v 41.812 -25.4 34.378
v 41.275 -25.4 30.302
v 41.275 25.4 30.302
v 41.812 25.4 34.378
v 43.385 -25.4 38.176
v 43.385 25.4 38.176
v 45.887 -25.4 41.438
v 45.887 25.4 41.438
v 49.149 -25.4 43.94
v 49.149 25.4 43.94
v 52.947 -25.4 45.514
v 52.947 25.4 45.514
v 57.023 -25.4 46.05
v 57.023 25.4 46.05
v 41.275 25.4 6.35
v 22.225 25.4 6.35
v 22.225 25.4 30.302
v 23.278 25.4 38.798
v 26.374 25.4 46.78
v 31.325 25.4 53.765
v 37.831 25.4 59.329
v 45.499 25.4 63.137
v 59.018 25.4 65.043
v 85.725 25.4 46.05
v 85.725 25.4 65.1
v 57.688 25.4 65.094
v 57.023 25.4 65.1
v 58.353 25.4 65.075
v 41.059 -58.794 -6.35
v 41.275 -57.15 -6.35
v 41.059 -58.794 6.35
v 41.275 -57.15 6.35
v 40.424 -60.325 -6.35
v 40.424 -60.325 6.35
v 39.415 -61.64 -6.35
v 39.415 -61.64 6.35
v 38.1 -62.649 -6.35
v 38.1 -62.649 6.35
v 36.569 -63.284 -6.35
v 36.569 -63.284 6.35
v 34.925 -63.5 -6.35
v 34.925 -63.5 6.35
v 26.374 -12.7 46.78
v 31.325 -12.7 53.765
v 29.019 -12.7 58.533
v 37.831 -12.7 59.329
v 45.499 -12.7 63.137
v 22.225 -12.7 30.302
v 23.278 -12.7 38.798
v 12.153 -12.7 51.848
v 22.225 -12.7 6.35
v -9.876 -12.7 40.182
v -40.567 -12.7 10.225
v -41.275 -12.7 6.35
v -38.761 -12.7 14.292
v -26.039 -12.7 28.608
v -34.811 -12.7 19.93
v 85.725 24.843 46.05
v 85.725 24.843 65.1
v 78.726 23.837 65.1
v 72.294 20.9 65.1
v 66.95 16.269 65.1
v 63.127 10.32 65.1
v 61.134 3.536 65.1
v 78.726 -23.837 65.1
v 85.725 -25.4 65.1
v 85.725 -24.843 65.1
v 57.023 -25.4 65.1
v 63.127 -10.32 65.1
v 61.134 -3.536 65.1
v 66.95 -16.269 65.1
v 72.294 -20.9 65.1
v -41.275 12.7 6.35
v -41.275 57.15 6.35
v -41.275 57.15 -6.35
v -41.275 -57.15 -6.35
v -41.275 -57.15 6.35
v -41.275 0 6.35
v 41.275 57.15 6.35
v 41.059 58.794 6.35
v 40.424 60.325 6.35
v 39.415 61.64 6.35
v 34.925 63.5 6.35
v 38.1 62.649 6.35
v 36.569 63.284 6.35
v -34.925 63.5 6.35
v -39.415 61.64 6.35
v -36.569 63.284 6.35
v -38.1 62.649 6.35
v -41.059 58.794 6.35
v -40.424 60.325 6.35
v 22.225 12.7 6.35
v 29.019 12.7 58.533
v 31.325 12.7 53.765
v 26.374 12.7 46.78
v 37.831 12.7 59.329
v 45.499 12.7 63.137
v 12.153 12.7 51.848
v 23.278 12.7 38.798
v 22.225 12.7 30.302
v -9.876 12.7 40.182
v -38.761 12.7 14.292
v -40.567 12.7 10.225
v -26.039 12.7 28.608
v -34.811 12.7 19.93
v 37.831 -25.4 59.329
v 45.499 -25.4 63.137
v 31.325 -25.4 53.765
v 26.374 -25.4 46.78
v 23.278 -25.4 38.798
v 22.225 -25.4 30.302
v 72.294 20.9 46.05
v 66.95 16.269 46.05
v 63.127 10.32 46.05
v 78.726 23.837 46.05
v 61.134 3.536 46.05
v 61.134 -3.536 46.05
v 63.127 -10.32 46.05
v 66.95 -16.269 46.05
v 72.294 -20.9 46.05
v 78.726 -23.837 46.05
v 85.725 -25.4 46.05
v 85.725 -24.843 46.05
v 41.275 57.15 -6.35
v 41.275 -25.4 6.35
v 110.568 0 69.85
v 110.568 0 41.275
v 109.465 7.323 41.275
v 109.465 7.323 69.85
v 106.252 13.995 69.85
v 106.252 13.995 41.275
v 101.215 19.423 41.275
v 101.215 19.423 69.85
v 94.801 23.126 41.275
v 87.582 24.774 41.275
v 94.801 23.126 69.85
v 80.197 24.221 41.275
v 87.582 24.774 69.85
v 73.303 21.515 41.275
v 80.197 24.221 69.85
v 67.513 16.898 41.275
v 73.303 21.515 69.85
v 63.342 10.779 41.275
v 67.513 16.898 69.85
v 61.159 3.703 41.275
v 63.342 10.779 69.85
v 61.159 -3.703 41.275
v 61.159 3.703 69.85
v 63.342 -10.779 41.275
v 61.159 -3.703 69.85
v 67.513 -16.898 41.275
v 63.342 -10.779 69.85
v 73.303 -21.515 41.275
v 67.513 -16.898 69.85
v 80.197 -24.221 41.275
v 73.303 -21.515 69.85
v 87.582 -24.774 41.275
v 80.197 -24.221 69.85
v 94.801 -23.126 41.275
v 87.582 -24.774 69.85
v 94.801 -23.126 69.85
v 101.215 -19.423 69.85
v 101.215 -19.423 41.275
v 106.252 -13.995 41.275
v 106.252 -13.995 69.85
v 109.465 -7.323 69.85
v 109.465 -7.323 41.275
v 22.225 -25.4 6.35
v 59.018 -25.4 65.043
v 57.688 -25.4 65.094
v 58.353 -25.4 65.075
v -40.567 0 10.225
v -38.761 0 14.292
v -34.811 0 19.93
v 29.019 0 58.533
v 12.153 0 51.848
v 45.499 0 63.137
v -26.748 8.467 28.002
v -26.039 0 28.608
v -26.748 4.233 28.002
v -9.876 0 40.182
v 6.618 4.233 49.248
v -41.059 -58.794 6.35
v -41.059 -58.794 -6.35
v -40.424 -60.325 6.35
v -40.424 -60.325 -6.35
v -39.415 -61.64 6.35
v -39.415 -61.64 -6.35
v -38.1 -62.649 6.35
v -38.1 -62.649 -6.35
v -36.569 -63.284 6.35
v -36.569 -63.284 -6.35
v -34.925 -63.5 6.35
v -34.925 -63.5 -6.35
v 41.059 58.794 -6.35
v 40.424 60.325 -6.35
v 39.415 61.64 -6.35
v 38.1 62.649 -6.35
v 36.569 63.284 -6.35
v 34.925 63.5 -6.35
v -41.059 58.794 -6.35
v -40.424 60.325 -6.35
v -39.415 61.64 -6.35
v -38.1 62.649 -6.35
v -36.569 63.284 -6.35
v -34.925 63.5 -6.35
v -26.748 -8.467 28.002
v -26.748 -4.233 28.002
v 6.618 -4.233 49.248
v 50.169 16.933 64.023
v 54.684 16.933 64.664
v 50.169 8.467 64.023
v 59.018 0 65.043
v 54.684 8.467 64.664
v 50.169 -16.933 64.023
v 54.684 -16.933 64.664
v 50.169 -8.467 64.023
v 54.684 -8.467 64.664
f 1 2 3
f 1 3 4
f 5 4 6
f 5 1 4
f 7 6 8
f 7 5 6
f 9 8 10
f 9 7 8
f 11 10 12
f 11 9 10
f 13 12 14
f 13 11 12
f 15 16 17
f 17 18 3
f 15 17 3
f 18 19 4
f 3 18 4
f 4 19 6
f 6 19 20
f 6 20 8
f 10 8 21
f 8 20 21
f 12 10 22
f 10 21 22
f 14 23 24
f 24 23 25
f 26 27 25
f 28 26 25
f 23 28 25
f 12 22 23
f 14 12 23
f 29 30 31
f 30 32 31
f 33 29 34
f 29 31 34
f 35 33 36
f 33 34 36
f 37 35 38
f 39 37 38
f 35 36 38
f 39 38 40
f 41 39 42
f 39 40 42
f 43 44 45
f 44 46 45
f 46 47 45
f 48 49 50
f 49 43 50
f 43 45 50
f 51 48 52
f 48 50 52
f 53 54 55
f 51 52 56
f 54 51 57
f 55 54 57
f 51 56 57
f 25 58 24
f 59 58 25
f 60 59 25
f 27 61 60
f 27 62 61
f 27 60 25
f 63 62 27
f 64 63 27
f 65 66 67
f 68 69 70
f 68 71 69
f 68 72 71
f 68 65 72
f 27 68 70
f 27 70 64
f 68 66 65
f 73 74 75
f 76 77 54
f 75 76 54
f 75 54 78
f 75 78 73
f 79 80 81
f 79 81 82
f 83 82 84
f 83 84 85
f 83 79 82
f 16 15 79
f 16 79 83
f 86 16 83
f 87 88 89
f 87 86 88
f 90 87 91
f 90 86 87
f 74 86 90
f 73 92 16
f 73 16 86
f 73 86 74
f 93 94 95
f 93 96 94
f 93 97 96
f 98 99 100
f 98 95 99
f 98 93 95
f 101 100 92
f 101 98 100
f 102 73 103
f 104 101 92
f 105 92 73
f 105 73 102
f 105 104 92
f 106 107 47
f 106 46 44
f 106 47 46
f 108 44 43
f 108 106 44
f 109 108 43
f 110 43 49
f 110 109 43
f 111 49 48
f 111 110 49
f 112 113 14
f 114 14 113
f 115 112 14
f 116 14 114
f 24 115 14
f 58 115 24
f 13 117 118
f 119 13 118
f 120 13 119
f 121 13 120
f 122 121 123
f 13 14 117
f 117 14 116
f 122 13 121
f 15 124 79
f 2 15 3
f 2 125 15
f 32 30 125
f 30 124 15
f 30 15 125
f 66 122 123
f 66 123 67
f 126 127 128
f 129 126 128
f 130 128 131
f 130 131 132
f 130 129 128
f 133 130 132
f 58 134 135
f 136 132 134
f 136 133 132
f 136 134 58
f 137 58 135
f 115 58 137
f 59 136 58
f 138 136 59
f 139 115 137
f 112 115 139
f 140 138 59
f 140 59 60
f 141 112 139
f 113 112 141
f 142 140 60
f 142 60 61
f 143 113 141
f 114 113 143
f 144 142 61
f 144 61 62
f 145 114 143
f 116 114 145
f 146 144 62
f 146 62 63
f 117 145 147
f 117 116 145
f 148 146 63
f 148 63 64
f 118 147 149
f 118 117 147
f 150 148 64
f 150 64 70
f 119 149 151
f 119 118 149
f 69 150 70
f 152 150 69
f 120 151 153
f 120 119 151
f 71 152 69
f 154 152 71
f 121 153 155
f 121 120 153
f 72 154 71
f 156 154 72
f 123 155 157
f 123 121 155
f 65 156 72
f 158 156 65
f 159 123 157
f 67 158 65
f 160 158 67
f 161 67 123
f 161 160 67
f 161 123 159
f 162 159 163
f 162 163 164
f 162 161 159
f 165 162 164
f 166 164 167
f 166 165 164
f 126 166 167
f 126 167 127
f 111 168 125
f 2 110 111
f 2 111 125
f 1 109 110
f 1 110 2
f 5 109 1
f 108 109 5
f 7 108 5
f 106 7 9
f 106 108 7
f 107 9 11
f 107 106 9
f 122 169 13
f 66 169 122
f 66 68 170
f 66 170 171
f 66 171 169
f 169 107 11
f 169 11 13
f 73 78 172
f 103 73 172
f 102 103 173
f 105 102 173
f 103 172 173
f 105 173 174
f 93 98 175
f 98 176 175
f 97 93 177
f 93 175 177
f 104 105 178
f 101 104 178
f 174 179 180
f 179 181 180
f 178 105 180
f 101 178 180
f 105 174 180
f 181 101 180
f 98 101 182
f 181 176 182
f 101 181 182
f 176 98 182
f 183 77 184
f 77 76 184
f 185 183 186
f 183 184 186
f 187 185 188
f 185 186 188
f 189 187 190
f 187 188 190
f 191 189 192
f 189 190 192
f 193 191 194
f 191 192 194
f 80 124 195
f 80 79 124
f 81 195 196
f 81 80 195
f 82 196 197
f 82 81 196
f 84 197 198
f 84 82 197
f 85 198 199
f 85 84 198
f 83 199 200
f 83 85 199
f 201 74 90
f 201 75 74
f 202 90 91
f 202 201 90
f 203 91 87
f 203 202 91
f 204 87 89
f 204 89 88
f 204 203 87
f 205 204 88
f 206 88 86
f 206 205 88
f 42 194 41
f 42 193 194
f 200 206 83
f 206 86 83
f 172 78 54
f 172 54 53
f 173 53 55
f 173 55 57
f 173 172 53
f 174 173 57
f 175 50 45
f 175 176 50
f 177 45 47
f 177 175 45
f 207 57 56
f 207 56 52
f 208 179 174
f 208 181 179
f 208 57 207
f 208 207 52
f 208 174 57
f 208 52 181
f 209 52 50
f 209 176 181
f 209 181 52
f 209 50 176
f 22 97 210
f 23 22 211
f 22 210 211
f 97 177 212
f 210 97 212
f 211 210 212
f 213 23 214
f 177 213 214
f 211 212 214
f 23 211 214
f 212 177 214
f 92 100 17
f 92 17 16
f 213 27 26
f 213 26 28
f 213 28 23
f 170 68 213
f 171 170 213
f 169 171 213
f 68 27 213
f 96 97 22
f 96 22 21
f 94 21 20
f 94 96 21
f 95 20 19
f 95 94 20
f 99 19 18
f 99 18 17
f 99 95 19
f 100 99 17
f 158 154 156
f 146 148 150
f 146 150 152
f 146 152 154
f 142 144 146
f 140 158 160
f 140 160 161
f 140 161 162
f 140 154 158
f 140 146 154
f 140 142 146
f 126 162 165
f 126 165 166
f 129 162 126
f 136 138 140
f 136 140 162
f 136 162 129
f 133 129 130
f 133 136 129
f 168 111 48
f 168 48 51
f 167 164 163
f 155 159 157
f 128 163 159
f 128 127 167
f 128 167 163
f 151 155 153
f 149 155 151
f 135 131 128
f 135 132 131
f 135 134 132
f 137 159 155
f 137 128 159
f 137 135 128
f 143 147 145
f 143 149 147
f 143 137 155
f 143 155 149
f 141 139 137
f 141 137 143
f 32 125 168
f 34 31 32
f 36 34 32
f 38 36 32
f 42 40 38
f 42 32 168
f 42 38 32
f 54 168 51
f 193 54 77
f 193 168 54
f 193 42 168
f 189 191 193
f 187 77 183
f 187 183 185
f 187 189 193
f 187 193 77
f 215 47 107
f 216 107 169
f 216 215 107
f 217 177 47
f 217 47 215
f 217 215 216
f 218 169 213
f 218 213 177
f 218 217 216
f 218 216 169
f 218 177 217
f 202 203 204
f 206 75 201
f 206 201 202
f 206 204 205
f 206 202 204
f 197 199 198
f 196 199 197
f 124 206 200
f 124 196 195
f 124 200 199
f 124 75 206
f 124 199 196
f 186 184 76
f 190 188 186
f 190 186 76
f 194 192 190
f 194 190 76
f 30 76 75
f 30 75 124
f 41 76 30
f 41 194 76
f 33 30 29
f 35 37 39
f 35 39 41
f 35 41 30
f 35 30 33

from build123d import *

# Parameters (mm, degrees)
F1_DEPTH = 63.5
F0_W     = 25.9565819922
F0_H     = 19.05
F2_DEPTH = 25.4
F3_DEPTH = 12.7
F5_R     = 6.35


with BuildPart() as f1:
    # F0 (on Front) → F1 (new body, symmetric)
    with BuildSketch(Plane.XZ):
        Polygon((22.225, 6.35), (-41.275, 6.35), (-41.275, -6.35), (41.275, -6.35), (41.275, 6.35), align=None)
    extrude(amount=F1_DEPTH, both=True)

    # F0 (on Front) → F2 (join, symmetric)
    with BuildSketch(Plane.XZ):
        with BuildLine():
            Line((22.225, 30.3022), (22.225, 6.35))
            Line((22.225, 6.35), (41.275, 6.35))
            Line((41.275, 6.35), (41.275, 30.3022))
            ThreePointArc((41.275, 30.3022), (45.8874824099, 41.4377175901), (57.023, 46.0502))
            Line((57.023, 46.0502), (59.7684180078, 46.0502))
            Line((59.7684180078, 46.0502), (59.7684180078, 65.1002))
            Line((59.7684180078, 65.1002), (57.023, 65.1002))
            ThreePointArc((57.023, 65.1002), (58.0206866195, 65.0858948211), (59.0175529571, 65.042991046))
            add(Edge.make_bspline(
                [(45.498923229, 63.1365792171), (50.2364600679, 64.1417845), (54.78396405, 64.7988002062), (59.0175529571, 65.042991046)],
                knots=[103.0762503935, 103.0762503935, 103.0762503935, 103.0762503935, 116.2044034303, 116.2044034303, 116.2044034303, 116.2044034303], degree=3))
            ThreePointArc((45.498923229, 63.1365792171), (28.6336038504, 50.4253953293), (22.225, 30.3022))
        make_face()
        with Locations((72.7467090039, 55.5752)):
            Rectangle(F0_W, F0_H)
    extrude(amount=F2_DEPTH, both=True)

    # F0 (on Front) → F3 (join, symmetric)
    with BuildSketch(Plane.XZ):
        with BuildLine():
            add(Edge.make_bspline(
                [(-41.275, 6.35), (-40.6099216302, 25.8870106414), (8.301951797, 55.244167303), (45.498923229, 63.1365792171)],
                knots=[0, 0, 0, 0, 103.0762503935, 103.0762503935, 103.0762503935, 103.0762503935], degree=3))
            Line((-41.275, 6.35), (22.225, 6.35))
            Line((22.225, 6.35), (22.225, 30.3022))
            ThreePointArc((22.225, 30.3022), (28.6336038504, 50.4253953293), (45.498923229, 63.1365792171))
        make_face()
    extrude(amount=F3_DEPTH, both=True)

    # F0 (on Front) → F4 (revolve)
    with BuildSketch(Plane.XZ):
        Polygon((85.725, 69.85), (85.725, 65.1002), (85.725, 46.0502), (85.725, 41.275), (110.5684180078, 41.275), (110.5684180078, 69.85), align=None)
    revolve(axis=Axis((85.725, 0, 55.5625), (0, 0, 1)))

    # F5
    f5_edges = [f1.edges().sort_by_distance(p)[0] for p in [
        (-41.275, -63.5, 0),
        (41.275, -63.5, 0),
        (41.275, 63.5, 0),
        (-41.275, 63.5, 0),
    ]]
    fillet(f5_edges, radius=F5_R)


solid = f1.part
